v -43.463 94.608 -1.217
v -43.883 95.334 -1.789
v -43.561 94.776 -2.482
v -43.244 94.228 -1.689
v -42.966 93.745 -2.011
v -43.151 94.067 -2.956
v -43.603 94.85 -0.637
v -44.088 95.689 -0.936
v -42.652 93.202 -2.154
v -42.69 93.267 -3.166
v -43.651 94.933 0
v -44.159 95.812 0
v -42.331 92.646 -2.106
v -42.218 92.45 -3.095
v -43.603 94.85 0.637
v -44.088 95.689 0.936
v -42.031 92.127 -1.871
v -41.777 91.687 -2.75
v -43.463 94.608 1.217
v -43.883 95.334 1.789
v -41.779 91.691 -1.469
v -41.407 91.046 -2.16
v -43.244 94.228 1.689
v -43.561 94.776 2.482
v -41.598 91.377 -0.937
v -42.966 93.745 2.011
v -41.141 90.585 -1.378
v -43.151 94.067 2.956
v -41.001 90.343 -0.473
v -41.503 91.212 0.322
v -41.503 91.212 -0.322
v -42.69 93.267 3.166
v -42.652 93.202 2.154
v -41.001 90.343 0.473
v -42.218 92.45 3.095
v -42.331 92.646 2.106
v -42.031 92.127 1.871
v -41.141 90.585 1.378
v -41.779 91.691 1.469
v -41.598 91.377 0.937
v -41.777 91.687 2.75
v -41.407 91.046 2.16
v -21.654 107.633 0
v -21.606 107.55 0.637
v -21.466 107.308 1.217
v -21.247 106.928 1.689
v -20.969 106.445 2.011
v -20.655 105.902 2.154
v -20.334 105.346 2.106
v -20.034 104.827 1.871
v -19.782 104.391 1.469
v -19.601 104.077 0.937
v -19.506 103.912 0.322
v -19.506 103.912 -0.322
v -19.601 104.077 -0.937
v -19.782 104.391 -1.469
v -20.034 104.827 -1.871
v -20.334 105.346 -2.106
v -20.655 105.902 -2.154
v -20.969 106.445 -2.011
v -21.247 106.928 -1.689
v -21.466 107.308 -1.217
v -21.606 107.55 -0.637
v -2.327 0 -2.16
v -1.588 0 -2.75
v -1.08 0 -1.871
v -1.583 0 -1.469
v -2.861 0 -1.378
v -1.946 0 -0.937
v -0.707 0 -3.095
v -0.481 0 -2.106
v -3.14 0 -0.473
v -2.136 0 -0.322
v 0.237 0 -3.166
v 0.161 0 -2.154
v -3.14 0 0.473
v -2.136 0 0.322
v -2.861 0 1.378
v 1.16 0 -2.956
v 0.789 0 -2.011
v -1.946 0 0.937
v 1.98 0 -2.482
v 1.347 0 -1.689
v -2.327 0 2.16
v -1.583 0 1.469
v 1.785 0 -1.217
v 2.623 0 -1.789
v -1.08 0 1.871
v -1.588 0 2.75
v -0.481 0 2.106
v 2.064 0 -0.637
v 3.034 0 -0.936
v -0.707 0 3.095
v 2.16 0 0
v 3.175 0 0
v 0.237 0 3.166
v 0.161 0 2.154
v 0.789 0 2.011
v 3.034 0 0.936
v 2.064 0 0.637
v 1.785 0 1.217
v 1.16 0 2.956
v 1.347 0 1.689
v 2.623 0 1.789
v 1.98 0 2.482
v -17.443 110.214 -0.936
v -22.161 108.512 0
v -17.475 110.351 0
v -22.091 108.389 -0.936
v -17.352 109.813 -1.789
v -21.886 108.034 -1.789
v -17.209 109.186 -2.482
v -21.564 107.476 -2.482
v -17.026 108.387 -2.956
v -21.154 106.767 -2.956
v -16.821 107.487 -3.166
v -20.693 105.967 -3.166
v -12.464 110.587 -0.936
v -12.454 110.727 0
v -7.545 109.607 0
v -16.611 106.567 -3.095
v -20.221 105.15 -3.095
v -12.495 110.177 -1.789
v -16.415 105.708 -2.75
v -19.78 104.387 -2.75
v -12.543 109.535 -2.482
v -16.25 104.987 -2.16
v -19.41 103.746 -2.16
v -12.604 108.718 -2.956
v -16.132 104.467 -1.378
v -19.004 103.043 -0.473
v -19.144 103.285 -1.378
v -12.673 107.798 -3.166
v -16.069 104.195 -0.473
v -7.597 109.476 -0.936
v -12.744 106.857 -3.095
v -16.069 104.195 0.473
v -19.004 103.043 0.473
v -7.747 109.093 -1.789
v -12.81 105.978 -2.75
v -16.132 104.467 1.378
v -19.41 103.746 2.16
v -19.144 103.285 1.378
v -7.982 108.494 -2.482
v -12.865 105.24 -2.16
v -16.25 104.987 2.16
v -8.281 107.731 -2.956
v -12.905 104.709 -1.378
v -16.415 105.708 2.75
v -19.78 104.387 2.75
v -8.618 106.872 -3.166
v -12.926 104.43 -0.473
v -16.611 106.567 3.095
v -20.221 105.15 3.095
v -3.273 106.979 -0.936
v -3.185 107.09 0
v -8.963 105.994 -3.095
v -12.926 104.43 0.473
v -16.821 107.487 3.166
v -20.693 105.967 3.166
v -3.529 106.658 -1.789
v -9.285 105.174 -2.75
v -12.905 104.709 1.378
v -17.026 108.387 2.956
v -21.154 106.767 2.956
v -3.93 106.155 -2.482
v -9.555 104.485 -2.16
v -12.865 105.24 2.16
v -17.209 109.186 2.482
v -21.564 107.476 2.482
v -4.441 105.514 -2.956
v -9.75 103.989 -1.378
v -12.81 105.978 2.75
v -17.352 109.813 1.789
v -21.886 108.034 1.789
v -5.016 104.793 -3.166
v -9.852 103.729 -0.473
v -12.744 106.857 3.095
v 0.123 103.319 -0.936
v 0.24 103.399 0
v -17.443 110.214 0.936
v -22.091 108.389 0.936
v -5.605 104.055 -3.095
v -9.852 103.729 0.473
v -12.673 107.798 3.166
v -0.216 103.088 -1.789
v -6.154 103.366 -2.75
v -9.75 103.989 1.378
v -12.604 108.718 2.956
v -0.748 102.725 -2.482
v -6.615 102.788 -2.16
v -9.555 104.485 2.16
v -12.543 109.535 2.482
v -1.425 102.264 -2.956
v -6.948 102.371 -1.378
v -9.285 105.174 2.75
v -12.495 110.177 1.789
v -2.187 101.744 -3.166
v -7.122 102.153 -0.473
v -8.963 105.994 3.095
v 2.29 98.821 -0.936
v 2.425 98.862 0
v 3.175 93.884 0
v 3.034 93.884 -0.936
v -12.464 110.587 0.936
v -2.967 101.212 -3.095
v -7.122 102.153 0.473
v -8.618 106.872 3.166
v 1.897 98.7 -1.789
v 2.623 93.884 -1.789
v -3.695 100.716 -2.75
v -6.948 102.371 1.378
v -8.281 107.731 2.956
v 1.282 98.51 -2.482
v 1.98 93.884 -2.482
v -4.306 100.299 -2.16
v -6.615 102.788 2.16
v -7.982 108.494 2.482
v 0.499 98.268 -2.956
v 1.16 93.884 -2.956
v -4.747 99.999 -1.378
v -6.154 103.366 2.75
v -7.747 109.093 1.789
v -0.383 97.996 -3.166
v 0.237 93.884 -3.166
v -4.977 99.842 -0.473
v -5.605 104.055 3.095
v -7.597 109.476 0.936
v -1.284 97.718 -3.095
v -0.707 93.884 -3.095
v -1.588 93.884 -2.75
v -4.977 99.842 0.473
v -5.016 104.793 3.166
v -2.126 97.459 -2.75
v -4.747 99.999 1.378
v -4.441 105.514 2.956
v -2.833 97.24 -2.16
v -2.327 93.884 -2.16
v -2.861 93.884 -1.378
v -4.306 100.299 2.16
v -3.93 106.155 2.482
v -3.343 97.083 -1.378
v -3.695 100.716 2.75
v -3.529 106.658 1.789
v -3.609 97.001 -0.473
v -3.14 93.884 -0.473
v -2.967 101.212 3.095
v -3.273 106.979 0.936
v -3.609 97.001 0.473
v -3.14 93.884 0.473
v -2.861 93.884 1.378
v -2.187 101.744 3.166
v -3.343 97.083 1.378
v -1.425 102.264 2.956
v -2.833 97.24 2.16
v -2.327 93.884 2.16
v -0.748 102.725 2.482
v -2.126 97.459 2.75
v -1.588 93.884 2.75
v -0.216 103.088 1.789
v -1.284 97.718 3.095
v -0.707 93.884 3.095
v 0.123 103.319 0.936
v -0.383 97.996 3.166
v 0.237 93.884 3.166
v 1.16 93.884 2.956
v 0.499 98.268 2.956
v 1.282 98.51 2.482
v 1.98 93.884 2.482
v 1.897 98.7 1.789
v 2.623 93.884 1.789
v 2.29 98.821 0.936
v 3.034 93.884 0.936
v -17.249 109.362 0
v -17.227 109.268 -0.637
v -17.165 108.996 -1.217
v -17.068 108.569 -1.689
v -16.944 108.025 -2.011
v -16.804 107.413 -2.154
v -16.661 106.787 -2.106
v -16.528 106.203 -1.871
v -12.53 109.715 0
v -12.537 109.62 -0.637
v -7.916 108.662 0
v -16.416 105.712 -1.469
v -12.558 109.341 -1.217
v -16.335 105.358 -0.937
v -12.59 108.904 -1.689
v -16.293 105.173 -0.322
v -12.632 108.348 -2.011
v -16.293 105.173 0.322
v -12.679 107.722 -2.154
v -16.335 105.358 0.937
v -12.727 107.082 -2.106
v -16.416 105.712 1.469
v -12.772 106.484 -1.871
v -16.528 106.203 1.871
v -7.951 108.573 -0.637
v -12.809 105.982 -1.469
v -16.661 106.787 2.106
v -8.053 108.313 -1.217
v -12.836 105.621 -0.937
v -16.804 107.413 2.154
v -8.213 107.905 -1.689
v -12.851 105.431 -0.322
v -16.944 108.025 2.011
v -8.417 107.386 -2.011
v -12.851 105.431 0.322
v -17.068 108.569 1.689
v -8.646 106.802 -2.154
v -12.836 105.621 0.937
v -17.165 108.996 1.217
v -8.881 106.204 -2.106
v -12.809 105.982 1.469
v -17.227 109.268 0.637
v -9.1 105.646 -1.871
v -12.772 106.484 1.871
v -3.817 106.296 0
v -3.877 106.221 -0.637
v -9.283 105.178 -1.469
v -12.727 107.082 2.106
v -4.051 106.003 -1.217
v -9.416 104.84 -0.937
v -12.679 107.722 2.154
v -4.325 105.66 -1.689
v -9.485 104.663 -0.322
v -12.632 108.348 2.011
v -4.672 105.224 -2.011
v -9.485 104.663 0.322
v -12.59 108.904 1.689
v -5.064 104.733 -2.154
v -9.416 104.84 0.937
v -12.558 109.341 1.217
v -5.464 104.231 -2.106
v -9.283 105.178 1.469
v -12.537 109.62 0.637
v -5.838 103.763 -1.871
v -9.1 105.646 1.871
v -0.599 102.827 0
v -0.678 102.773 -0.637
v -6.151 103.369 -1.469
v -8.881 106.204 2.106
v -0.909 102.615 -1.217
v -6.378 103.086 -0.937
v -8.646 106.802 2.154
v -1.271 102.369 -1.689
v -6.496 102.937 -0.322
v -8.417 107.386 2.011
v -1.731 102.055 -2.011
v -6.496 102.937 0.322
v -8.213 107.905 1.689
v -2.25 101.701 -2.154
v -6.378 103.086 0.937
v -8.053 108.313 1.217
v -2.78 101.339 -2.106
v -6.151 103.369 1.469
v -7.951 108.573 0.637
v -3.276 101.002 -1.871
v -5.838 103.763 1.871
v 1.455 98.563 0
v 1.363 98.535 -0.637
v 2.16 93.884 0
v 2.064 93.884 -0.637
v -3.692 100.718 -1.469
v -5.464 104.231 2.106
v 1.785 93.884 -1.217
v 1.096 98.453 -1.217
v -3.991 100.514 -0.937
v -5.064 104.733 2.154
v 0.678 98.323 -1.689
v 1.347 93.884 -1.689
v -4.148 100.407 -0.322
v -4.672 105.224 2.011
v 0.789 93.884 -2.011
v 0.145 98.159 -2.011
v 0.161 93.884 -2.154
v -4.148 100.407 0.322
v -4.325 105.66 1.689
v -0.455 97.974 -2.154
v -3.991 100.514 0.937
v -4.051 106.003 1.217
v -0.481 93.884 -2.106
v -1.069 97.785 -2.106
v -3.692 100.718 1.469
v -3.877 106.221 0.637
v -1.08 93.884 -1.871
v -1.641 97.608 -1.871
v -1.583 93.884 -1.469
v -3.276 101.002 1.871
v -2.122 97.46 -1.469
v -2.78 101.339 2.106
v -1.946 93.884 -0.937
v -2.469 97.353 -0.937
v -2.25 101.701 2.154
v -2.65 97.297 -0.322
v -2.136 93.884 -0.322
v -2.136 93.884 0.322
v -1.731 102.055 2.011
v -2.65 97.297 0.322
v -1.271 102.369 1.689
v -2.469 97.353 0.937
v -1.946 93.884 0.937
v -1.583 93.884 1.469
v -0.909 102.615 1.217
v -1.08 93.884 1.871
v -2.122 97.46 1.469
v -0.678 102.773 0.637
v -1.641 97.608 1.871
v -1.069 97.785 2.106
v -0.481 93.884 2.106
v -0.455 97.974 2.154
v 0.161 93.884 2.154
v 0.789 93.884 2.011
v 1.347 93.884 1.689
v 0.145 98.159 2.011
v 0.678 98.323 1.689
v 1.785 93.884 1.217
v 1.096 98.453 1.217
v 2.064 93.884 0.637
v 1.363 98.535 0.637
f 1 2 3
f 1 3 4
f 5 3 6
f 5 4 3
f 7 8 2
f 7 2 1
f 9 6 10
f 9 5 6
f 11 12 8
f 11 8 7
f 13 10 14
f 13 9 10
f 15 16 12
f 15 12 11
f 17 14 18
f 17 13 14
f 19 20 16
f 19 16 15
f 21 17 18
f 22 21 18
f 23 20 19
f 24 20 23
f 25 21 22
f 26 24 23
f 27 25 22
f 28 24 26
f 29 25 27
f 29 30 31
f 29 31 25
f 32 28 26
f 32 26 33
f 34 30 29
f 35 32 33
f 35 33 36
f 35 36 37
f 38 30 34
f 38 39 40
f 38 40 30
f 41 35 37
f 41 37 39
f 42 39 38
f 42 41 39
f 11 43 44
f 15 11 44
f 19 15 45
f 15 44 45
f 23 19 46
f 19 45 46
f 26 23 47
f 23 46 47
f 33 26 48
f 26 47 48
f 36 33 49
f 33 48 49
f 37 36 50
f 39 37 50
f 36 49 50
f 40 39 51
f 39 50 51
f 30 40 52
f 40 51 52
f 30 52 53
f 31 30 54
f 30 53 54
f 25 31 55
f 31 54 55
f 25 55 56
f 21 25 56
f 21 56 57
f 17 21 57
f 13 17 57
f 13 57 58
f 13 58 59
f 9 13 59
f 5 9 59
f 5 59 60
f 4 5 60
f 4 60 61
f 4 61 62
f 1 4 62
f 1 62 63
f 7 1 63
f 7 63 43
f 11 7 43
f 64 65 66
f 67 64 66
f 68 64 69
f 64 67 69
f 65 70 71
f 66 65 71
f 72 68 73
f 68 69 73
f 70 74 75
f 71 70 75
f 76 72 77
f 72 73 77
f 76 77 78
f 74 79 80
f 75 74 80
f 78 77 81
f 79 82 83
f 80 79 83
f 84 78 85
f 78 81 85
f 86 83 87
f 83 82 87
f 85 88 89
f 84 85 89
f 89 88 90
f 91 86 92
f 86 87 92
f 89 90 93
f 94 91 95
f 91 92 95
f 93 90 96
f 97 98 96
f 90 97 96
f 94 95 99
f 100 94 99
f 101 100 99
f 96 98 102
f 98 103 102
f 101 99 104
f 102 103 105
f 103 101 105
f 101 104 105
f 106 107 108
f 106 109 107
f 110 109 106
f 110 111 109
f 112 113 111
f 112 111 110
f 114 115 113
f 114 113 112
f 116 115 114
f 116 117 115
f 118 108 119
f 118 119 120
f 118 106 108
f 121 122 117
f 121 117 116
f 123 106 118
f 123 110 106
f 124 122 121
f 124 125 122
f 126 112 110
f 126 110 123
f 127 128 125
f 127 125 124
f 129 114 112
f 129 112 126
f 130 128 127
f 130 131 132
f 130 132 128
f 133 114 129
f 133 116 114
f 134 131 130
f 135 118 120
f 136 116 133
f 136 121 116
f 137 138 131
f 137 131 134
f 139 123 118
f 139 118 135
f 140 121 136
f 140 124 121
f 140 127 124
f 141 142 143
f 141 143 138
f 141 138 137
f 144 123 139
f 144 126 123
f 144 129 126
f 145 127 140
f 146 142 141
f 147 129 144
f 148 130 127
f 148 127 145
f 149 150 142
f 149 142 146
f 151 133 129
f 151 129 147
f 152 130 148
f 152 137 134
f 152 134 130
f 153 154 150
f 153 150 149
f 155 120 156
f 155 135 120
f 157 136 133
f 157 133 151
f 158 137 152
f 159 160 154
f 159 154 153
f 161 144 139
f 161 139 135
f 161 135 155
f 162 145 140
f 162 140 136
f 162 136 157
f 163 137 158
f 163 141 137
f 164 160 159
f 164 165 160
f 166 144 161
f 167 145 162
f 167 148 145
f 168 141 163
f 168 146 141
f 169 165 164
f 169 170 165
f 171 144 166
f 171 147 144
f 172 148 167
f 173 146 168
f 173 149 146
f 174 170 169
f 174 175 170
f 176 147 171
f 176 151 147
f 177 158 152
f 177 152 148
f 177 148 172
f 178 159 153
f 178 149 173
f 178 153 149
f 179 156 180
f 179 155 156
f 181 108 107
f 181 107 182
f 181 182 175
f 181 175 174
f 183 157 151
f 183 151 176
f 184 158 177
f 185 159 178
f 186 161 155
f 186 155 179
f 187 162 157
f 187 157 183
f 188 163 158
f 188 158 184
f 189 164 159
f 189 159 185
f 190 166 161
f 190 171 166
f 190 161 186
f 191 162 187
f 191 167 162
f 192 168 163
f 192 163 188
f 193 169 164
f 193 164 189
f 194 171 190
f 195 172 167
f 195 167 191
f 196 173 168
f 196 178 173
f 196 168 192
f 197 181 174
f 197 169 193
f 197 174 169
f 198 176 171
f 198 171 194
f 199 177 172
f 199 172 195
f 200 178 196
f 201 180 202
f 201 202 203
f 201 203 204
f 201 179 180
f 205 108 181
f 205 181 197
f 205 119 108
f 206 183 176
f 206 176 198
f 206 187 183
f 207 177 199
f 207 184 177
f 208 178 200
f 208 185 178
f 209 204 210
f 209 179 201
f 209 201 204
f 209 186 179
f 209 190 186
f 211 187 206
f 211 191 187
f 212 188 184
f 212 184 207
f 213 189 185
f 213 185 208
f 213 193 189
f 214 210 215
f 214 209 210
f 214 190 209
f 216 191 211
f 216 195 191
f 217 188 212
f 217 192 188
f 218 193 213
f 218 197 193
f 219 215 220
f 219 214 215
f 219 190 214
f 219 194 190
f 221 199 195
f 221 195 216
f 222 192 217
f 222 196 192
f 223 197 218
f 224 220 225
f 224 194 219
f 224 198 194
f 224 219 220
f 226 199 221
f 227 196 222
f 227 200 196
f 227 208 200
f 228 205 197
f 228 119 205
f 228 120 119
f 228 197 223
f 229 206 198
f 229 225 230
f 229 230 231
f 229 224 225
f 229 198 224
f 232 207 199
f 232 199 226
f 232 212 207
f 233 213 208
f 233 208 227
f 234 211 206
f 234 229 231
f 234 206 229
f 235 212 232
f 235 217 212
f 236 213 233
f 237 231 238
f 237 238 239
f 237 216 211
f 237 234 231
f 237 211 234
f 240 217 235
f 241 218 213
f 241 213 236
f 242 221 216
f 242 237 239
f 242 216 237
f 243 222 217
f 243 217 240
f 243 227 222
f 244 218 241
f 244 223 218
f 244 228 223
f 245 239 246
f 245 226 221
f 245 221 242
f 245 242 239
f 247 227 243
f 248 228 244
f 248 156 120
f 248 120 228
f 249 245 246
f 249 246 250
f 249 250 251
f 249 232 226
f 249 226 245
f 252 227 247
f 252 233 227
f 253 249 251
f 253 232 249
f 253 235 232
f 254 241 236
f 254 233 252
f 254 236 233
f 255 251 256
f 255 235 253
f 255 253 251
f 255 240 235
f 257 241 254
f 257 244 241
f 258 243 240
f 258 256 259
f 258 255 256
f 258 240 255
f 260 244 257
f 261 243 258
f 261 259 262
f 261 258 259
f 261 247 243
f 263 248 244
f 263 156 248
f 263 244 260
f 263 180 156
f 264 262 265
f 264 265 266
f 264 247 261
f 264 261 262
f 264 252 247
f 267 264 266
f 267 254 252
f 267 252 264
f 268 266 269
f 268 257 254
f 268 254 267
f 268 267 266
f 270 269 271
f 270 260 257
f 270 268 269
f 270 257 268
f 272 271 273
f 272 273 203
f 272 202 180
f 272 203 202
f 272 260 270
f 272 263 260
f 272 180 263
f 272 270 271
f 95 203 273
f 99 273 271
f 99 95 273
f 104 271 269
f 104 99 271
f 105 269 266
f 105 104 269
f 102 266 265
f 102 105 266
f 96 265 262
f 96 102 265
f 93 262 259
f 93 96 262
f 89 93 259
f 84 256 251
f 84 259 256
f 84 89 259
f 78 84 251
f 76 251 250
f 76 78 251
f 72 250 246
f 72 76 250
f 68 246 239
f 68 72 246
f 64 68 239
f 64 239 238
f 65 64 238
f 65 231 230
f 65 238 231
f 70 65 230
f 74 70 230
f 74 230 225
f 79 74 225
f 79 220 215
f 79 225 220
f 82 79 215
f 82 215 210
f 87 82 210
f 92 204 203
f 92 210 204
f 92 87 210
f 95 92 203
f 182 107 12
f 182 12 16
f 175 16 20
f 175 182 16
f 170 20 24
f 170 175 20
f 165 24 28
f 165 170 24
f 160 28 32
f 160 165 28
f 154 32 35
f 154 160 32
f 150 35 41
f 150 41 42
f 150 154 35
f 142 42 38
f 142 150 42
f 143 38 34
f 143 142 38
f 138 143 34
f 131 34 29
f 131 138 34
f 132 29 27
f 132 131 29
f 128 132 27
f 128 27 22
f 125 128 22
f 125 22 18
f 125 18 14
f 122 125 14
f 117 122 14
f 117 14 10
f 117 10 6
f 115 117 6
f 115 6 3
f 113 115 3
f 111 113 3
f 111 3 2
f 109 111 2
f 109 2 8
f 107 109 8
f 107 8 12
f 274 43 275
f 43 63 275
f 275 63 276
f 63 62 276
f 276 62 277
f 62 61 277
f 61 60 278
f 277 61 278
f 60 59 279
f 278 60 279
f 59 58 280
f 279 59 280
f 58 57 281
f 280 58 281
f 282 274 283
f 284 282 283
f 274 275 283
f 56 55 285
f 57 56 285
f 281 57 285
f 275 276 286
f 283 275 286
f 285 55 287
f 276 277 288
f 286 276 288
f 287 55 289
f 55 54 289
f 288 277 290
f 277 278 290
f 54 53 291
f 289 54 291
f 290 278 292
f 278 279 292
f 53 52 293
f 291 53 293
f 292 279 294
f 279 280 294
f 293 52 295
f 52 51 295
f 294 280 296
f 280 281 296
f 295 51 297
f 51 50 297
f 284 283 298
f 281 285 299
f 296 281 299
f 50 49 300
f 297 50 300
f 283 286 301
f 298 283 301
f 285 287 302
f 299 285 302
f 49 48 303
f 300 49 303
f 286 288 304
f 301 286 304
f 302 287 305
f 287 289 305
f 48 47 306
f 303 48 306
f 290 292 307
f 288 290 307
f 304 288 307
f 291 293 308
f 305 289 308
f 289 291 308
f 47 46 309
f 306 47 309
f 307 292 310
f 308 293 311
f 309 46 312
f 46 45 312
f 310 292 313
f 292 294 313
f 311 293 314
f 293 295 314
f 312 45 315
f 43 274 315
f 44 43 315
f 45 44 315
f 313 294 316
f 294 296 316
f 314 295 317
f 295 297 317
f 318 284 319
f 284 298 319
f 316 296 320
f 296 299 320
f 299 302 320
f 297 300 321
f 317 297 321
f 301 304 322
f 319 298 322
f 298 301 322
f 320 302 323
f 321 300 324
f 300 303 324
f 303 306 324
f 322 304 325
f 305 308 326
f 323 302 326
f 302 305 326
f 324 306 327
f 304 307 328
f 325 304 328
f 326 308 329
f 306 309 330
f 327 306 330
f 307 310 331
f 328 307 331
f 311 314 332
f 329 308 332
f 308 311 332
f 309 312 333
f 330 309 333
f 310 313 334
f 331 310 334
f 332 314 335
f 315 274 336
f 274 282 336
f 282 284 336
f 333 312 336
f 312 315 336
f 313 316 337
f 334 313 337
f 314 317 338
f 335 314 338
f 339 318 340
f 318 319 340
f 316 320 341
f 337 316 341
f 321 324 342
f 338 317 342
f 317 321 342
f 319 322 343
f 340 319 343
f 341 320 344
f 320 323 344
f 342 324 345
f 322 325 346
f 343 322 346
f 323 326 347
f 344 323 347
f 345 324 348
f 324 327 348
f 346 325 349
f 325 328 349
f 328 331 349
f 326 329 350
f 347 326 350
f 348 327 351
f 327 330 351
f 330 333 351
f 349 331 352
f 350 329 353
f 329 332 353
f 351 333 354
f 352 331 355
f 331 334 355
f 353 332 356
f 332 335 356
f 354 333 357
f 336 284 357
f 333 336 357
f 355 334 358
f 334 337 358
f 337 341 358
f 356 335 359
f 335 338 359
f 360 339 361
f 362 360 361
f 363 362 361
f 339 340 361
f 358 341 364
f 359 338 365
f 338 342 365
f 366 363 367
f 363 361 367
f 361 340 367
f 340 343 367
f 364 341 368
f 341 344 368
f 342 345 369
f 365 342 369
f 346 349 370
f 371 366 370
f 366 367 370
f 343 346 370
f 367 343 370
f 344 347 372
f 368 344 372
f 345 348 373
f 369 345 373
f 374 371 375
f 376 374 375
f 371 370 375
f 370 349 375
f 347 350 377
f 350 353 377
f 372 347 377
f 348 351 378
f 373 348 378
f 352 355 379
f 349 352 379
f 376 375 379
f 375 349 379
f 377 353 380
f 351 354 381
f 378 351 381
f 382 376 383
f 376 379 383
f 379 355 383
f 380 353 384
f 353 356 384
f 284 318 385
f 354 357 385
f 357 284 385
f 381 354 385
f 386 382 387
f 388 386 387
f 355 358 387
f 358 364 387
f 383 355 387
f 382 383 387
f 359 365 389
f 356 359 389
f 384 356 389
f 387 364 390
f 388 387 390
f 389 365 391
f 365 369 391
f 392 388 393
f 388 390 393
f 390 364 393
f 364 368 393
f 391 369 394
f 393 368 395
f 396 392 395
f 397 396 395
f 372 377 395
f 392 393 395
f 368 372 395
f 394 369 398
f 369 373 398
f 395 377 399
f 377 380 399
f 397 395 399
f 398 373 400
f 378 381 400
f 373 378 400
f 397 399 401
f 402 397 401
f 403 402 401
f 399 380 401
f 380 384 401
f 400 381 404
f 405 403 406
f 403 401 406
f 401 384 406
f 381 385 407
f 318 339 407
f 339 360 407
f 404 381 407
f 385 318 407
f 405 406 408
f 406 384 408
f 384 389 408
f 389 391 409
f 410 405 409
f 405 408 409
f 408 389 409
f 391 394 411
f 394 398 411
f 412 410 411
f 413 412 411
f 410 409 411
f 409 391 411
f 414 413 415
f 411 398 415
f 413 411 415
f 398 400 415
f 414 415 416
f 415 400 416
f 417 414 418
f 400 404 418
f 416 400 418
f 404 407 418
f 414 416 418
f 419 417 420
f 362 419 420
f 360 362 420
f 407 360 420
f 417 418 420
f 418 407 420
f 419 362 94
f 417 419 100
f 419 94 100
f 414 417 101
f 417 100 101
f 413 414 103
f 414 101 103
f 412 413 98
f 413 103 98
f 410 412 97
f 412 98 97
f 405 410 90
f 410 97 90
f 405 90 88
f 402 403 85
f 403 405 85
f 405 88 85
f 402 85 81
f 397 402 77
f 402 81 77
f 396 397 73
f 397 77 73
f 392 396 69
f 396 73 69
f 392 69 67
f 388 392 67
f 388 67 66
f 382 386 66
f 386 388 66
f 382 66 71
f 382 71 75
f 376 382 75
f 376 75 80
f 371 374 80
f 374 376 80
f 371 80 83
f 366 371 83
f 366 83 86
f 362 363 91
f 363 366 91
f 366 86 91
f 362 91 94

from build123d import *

# Parameters (mm, degrees)
SKETCH1_R   = 3.175
SKETCH1_R_2 = 2.16


with BuildPart() as part:
    # Sweep1: sweep along a path in Sketch2
    with BuildLine(Plane.XY) as sweep1_path:
        Line((-42.571045256, 93.062008577), (-20.574, 105.762008577))
        ThreePointArc((-20.574, 105.762008577), (-6.858, 105.762008577), (0, 93.883604139))
        Line((0, 93.883604139), (0, 0))
    # Sketch1 → Sweep1 (sweep)
    with BuildSketch(Plane(origin=(0, 0, 0), x_dir=(1, 0, 0), z_dir=(0, 1, 0))):
        Circle(SKETCH1_R)
        Circle(SKETCH1_R_2, mode=Mode.SUBTRACT)
    sweep(path=sweep1_path.line)


solid = part.part
